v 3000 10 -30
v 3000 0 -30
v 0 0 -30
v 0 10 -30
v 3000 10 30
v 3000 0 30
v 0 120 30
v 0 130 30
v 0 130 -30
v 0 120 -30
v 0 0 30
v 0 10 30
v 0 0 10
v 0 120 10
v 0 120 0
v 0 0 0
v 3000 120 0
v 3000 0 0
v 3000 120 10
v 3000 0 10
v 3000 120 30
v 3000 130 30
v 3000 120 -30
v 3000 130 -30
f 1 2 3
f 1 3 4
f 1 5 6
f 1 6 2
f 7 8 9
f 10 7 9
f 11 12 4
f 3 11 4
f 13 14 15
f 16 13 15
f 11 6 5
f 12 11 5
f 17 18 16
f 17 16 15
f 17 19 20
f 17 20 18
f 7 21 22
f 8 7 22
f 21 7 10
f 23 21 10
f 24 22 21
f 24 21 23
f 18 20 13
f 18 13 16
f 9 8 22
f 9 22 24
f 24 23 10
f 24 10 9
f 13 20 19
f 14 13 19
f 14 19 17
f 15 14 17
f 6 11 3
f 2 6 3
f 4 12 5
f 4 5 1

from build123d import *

# Parameters (mm, degrees)
SKETCH_1_W        = 60
SKETCH_1_H        = 10
EXTRUDE_1_DEPTH   = 3000
SKETCH_1_W_2      = 10
SKETCH_1_H_2      = 120
EXTRUDE_1_2_DEPTH = 3000
EXTRUDE_1_3_DEPTH = 3000


with BuildPart() as part:
    # Эскиз1 → Вытянуть-Тонкостенный1 (new body)
    with BuildSketch(Plane(origin=(0, 0, 0), x_dir=(0, 0, -1), z_dir=(1, 0, 0))):
        with Locations((0, 5)):
            Rectangle(SKETCH_1_W, SKETCH_1_H)
    extrude(amount=EXTRUDE_1_DEPTH)


with BuildPart() as body_2:
    # Эскиз1 → Extrude 1 2 (new body)
    with BuildSketch(Plane(origin=(0, 0, 0), x_dir=(0, 0, -1), z_dir=(1, 0, 0))):
        with Locations((-5, 60)):
            Rectangle(SKETCH_1_W_2, SKETCH_1_H_2)
    extrude(amount=EXTRUDE_1_2_DEPTH)


with BuildPart() as body_3:
    # Эскиз1 → Extrude 1 3 (new body)
    with BuildSketch(Plane(origin=(0, 0, 0), x_dir=(0, 0, -1), z_dir=(1, 0, 0))):
        with Locations((0, 125)):
            Rectangle(SKETCH_1_W, SKETCH_1_H)
    extrude(amount=EXTRUDE_1_3_DEPTH)


solid = Compound([part.part, body_2.part, body_3.part])
